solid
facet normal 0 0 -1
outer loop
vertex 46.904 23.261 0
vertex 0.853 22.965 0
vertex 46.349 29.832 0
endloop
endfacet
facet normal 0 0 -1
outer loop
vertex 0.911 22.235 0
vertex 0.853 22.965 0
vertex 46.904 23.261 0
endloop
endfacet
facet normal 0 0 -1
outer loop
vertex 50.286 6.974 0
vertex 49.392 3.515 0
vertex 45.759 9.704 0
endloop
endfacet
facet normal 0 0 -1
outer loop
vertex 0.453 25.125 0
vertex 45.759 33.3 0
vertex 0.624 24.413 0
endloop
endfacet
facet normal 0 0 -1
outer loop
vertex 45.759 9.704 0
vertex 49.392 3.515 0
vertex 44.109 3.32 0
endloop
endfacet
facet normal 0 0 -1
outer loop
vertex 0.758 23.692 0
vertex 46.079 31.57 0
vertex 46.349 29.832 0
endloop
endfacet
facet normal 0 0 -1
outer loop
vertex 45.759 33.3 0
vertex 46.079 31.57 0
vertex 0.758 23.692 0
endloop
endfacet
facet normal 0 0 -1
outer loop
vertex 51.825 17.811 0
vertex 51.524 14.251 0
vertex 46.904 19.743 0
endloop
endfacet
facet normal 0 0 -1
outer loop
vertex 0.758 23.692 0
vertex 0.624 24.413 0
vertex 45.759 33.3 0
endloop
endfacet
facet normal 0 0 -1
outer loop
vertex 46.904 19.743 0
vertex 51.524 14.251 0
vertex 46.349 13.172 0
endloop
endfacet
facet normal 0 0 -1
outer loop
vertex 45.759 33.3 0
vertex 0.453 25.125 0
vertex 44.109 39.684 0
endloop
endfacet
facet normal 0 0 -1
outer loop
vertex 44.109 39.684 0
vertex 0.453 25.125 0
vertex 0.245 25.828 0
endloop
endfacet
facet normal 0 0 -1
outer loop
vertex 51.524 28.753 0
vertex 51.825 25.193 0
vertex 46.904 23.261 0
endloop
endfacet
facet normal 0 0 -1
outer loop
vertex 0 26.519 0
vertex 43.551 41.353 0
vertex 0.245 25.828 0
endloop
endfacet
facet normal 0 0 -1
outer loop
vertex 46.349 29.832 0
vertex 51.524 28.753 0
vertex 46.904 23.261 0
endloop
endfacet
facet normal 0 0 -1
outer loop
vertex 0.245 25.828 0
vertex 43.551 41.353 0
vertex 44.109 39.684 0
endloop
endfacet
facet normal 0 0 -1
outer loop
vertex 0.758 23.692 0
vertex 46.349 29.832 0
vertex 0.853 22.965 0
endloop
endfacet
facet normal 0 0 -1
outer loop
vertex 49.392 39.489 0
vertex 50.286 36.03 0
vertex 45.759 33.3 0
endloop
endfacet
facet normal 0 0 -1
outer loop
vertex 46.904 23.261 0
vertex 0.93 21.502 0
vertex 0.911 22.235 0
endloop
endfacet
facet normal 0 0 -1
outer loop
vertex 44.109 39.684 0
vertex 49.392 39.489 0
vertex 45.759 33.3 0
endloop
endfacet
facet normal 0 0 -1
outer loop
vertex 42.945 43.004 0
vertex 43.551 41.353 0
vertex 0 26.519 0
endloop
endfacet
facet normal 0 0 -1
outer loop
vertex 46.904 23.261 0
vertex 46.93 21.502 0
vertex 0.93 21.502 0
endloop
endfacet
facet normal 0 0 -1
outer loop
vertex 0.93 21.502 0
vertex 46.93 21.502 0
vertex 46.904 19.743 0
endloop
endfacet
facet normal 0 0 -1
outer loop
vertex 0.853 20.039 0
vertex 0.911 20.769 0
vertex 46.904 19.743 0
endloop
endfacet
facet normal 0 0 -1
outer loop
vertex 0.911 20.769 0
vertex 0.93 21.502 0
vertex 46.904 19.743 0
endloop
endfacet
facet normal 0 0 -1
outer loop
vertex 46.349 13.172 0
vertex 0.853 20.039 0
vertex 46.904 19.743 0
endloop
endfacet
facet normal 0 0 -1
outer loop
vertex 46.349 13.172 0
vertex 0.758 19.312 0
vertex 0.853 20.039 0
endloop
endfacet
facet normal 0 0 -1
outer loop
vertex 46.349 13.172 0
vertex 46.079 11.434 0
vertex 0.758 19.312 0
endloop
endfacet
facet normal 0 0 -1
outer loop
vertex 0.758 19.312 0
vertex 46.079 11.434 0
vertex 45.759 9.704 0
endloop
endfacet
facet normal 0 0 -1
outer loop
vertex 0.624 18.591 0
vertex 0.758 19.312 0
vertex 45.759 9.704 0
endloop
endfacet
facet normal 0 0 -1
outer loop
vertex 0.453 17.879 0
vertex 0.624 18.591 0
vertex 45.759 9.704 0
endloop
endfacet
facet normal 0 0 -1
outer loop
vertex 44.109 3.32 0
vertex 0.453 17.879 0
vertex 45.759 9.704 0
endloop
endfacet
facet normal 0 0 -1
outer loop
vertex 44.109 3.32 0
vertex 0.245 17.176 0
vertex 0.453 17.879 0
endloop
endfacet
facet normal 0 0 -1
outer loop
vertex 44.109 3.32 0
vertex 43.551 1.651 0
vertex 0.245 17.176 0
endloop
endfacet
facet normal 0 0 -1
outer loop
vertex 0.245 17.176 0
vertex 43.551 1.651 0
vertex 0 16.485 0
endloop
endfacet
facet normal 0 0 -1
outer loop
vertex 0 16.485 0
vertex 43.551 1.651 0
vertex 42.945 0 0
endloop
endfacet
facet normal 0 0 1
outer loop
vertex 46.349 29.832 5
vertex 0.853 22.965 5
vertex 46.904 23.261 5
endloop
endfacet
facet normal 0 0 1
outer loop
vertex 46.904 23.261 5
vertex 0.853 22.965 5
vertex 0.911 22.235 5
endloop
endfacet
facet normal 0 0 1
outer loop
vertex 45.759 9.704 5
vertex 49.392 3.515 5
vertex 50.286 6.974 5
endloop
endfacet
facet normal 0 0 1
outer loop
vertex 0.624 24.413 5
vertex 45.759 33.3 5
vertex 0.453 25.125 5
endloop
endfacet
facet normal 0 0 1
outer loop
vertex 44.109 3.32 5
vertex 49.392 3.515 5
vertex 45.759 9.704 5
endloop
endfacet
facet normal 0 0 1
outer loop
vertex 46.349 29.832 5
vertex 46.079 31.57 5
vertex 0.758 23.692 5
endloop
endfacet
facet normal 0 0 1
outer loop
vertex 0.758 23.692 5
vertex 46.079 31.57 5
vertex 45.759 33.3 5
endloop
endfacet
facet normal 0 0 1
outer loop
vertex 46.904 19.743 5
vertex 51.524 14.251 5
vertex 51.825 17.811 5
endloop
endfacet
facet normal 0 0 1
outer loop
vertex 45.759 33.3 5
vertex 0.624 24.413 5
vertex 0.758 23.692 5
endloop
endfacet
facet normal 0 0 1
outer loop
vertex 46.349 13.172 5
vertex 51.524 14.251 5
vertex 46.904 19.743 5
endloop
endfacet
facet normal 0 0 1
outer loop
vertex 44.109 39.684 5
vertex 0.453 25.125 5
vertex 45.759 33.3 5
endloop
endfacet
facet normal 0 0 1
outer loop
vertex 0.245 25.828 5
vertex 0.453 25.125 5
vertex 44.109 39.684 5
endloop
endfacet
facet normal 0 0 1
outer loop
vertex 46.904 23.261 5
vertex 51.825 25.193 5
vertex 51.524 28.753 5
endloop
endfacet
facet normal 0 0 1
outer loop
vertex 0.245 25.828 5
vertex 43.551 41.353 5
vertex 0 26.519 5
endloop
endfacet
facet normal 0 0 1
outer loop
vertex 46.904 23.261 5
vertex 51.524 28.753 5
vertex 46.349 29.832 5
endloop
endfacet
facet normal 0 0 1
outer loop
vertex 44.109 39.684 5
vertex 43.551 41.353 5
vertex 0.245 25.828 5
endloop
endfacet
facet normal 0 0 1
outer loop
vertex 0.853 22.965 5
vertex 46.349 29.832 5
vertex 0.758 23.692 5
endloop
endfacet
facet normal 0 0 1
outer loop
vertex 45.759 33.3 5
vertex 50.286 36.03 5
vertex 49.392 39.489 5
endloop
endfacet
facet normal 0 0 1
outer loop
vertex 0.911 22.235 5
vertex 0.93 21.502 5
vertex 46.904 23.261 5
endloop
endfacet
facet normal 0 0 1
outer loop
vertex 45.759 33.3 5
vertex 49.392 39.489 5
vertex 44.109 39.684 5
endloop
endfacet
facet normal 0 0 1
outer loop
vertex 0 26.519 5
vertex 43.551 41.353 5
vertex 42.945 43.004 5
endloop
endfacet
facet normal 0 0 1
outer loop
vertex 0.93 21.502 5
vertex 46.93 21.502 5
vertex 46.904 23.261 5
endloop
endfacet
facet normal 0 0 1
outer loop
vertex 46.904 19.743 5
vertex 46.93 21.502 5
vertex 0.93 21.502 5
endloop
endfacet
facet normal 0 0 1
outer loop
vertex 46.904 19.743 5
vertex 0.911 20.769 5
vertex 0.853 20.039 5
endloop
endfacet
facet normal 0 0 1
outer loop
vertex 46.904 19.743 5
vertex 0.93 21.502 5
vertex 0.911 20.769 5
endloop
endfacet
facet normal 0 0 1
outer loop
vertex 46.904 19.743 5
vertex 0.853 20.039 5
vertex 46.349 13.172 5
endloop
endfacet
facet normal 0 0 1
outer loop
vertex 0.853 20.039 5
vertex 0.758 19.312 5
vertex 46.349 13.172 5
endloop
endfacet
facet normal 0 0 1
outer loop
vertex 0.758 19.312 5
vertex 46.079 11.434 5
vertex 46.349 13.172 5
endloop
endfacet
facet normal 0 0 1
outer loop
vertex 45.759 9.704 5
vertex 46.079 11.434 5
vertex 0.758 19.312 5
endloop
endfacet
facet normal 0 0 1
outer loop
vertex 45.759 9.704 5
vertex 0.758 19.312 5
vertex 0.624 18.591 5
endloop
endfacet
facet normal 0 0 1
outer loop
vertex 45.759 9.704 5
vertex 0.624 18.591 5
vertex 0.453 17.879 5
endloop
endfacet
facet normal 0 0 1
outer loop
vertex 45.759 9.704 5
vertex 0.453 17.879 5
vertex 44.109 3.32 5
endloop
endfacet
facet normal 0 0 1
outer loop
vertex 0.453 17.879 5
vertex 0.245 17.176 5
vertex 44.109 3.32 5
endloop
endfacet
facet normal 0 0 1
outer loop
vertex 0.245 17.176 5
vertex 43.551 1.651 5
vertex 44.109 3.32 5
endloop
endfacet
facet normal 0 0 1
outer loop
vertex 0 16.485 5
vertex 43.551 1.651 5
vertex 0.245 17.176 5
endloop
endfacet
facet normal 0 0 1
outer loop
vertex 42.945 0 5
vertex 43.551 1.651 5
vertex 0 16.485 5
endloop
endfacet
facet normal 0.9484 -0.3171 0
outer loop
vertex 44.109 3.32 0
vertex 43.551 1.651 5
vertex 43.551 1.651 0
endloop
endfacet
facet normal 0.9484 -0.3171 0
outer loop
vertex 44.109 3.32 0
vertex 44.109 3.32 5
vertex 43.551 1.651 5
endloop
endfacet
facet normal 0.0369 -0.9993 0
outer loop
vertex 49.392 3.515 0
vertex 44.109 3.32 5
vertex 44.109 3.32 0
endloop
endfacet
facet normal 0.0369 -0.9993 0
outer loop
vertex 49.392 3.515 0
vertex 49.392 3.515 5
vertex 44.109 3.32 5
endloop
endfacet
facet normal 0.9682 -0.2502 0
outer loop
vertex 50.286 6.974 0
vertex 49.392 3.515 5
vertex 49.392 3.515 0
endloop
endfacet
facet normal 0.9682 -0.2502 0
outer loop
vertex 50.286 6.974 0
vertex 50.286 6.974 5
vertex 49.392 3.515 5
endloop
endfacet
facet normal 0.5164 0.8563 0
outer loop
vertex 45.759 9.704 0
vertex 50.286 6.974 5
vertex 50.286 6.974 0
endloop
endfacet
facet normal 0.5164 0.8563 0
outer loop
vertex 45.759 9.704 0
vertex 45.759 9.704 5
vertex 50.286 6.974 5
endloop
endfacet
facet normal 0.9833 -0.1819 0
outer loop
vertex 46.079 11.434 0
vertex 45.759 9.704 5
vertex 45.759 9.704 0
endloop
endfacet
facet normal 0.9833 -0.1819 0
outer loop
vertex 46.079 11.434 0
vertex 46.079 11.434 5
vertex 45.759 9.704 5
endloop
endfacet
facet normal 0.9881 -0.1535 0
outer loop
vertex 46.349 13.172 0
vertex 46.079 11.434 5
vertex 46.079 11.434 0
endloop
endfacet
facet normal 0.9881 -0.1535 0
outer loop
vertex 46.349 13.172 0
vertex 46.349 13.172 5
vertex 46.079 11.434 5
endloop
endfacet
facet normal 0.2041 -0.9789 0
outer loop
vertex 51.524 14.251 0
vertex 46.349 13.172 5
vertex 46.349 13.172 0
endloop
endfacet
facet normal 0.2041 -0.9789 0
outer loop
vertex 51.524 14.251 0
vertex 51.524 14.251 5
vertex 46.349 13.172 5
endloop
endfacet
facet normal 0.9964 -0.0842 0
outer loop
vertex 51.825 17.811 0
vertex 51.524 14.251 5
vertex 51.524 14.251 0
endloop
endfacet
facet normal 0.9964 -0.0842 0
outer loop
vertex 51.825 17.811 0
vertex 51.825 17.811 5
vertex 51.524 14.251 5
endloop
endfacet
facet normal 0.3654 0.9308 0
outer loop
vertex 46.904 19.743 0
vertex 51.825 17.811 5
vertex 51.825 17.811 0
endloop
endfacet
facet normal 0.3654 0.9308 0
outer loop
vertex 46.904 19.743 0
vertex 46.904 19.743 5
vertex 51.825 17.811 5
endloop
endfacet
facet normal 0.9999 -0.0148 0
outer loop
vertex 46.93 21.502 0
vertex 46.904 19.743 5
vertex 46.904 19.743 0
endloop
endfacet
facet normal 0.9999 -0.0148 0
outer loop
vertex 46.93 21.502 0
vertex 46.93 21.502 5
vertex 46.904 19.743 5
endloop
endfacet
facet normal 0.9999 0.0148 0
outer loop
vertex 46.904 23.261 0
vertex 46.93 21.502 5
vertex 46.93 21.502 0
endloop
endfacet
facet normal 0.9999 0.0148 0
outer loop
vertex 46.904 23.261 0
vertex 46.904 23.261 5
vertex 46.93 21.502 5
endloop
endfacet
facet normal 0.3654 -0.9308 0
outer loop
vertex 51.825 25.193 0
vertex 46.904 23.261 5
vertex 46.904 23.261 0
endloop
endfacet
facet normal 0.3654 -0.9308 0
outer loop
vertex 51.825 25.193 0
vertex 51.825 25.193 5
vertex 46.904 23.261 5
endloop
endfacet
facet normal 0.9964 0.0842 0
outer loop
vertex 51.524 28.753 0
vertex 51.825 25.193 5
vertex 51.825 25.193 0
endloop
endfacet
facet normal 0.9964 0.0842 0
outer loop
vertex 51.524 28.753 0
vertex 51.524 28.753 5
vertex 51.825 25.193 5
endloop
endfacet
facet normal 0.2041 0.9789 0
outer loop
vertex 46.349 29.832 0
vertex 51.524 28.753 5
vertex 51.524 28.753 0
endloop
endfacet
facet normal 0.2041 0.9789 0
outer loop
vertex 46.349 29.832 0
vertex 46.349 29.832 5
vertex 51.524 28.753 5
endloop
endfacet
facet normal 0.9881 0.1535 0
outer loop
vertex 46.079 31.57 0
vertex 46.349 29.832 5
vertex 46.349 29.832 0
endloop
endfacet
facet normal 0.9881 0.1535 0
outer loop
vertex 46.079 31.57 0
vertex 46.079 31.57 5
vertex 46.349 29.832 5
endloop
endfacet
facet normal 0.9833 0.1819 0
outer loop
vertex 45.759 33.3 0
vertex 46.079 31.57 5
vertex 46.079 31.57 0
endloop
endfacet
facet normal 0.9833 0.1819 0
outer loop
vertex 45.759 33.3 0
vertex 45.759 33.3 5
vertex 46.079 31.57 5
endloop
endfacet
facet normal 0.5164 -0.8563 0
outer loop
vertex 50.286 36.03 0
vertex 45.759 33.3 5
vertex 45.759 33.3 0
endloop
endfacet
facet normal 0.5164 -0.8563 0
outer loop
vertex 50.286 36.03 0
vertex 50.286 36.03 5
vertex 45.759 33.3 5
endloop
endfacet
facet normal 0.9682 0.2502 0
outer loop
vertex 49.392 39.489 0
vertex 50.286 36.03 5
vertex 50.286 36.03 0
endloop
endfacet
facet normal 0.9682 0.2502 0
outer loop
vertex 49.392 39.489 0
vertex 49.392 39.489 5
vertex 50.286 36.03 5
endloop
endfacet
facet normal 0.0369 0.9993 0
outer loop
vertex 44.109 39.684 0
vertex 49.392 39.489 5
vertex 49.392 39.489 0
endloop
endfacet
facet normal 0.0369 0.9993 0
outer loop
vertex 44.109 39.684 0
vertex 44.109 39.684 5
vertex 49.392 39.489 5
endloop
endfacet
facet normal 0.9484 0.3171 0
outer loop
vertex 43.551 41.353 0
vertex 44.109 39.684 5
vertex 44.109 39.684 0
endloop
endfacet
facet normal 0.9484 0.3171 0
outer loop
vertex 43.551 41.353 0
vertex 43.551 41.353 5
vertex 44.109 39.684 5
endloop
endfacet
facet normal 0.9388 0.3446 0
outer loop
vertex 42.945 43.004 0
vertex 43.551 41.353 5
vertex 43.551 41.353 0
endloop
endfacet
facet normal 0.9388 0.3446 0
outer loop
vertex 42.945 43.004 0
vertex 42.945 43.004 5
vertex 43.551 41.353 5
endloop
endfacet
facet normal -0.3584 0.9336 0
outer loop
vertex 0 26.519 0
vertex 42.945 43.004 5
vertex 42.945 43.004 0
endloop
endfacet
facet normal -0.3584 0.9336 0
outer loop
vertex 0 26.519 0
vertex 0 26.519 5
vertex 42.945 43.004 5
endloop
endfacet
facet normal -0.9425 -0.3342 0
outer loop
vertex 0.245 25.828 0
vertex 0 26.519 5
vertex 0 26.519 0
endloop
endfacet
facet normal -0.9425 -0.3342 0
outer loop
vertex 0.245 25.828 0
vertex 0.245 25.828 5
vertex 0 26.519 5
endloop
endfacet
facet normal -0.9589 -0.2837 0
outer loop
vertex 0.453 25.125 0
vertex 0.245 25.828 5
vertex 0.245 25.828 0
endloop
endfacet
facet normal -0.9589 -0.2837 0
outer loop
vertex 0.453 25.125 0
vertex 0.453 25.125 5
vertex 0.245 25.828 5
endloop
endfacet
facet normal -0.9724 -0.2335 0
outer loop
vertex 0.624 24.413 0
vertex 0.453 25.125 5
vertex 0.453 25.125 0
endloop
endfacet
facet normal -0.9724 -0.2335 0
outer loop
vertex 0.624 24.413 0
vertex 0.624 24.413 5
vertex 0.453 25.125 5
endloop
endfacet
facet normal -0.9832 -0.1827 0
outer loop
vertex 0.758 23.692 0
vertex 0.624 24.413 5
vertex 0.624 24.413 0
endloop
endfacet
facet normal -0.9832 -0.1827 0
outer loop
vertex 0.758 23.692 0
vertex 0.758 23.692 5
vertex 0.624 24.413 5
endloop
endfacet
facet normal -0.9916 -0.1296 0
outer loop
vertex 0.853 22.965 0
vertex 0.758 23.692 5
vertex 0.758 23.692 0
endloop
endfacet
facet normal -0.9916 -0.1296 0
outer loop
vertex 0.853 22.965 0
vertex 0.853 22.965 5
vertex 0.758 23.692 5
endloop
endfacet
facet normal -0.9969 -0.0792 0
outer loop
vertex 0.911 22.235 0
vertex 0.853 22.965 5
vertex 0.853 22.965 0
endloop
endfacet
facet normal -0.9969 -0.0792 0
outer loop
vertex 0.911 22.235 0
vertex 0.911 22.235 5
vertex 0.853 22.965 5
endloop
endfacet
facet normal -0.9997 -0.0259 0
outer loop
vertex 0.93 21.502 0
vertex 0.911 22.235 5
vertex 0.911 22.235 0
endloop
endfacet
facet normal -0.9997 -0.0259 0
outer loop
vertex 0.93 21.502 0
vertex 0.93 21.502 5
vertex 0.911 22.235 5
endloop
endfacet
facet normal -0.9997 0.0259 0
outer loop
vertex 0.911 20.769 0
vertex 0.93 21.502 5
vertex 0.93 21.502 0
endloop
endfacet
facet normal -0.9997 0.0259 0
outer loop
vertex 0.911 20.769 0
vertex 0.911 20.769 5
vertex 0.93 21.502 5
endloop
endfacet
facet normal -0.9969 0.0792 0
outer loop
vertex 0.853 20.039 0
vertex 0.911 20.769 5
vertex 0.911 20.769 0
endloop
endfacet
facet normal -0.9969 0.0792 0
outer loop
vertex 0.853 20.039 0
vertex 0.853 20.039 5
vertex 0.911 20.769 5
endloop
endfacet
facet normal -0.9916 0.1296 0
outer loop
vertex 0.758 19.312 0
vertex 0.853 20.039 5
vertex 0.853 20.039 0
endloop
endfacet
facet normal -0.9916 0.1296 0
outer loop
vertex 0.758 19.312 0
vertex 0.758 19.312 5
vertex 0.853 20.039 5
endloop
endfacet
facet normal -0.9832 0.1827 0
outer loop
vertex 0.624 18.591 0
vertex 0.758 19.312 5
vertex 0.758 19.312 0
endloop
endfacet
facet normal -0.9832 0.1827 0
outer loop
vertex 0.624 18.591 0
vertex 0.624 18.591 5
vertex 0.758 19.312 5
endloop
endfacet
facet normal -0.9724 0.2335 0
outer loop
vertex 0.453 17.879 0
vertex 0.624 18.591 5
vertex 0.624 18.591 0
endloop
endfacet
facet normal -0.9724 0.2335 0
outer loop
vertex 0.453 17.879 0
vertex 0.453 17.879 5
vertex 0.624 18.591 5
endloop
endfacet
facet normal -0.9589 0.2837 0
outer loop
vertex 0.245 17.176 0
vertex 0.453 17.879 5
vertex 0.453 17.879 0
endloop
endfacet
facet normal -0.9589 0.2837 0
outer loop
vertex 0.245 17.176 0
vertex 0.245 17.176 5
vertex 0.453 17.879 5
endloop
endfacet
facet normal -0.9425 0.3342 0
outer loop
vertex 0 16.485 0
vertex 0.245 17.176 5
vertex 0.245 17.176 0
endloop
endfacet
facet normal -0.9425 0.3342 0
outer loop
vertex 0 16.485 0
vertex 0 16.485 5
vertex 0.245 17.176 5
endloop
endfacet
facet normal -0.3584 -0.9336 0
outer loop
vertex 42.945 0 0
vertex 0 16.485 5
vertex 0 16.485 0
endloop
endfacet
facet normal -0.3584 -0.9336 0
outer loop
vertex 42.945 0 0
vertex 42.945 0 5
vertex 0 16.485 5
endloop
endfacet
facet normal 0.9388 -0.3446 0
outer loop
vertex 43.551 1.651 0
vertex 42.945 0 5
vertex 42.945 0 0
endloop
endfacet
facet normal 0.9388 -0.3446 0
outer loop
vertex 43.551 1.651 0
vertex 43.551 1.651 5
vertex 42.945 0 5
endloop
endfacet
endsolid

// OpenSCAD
$fn = 32;

// ----------------------------------------------------------------------
// Gear sector: 4 teeth on 42 degrees
// ----------------------------------------------------------------------

// --- parameters (mm) ---
sector_angle = 42;        // sector angle, degrees
root_r = 60;              // root circle radius
tooth_h = 5;              // tooth height over the root circle
teeth = 4;                // number of teeth on the sector
hub_r = 14;               // hub bore radius
plate_t = 5;              // sector thickness, Z
arc_step = 3;             // sampling step of the root/hub arcs, degrees

tip_r = root_r + tooth_h;  // tip circle radius

profile = [[42.945, 0], [43.551, 1.651], [44.109, 3.32], [49.392, 3.515], [50.286, 6.974], [45.759, 9.704], [46.079, 11.434], [46.349, 13.172], [51.524, 14.251], [51.825, 17.811], [46.904, 19.743], [46.93, 21.502], [46.904, 23.261], [51.825, 25.193], [51.524, 28.753], [46.349, 29.832], [46.079, 31.57], [45.759, 33.3], [50.286, 36.03], [49.392, 39.489], [44.109, 39.684], [43.551, 41.353], [42.945, 43.004], [0, 26.519], [0.245, 25.828], [0.453, 25.125], [0.624, 24.413], [0.758, 23.692], [0.853, 22.965], [0.911, 22.235], [0.93, 21.502], [0.911, 20.769], [0.853, 20.039], [0.758, 19.312], [0.624, 18.591], [0.453, 17.879], [0.245, 17.176], [0, 16.485]];  // primary outline, 38 points, counter clockwise

// --- the one profile operation ---
linear_extrude(height = plate_t) polygon(points = profile);
